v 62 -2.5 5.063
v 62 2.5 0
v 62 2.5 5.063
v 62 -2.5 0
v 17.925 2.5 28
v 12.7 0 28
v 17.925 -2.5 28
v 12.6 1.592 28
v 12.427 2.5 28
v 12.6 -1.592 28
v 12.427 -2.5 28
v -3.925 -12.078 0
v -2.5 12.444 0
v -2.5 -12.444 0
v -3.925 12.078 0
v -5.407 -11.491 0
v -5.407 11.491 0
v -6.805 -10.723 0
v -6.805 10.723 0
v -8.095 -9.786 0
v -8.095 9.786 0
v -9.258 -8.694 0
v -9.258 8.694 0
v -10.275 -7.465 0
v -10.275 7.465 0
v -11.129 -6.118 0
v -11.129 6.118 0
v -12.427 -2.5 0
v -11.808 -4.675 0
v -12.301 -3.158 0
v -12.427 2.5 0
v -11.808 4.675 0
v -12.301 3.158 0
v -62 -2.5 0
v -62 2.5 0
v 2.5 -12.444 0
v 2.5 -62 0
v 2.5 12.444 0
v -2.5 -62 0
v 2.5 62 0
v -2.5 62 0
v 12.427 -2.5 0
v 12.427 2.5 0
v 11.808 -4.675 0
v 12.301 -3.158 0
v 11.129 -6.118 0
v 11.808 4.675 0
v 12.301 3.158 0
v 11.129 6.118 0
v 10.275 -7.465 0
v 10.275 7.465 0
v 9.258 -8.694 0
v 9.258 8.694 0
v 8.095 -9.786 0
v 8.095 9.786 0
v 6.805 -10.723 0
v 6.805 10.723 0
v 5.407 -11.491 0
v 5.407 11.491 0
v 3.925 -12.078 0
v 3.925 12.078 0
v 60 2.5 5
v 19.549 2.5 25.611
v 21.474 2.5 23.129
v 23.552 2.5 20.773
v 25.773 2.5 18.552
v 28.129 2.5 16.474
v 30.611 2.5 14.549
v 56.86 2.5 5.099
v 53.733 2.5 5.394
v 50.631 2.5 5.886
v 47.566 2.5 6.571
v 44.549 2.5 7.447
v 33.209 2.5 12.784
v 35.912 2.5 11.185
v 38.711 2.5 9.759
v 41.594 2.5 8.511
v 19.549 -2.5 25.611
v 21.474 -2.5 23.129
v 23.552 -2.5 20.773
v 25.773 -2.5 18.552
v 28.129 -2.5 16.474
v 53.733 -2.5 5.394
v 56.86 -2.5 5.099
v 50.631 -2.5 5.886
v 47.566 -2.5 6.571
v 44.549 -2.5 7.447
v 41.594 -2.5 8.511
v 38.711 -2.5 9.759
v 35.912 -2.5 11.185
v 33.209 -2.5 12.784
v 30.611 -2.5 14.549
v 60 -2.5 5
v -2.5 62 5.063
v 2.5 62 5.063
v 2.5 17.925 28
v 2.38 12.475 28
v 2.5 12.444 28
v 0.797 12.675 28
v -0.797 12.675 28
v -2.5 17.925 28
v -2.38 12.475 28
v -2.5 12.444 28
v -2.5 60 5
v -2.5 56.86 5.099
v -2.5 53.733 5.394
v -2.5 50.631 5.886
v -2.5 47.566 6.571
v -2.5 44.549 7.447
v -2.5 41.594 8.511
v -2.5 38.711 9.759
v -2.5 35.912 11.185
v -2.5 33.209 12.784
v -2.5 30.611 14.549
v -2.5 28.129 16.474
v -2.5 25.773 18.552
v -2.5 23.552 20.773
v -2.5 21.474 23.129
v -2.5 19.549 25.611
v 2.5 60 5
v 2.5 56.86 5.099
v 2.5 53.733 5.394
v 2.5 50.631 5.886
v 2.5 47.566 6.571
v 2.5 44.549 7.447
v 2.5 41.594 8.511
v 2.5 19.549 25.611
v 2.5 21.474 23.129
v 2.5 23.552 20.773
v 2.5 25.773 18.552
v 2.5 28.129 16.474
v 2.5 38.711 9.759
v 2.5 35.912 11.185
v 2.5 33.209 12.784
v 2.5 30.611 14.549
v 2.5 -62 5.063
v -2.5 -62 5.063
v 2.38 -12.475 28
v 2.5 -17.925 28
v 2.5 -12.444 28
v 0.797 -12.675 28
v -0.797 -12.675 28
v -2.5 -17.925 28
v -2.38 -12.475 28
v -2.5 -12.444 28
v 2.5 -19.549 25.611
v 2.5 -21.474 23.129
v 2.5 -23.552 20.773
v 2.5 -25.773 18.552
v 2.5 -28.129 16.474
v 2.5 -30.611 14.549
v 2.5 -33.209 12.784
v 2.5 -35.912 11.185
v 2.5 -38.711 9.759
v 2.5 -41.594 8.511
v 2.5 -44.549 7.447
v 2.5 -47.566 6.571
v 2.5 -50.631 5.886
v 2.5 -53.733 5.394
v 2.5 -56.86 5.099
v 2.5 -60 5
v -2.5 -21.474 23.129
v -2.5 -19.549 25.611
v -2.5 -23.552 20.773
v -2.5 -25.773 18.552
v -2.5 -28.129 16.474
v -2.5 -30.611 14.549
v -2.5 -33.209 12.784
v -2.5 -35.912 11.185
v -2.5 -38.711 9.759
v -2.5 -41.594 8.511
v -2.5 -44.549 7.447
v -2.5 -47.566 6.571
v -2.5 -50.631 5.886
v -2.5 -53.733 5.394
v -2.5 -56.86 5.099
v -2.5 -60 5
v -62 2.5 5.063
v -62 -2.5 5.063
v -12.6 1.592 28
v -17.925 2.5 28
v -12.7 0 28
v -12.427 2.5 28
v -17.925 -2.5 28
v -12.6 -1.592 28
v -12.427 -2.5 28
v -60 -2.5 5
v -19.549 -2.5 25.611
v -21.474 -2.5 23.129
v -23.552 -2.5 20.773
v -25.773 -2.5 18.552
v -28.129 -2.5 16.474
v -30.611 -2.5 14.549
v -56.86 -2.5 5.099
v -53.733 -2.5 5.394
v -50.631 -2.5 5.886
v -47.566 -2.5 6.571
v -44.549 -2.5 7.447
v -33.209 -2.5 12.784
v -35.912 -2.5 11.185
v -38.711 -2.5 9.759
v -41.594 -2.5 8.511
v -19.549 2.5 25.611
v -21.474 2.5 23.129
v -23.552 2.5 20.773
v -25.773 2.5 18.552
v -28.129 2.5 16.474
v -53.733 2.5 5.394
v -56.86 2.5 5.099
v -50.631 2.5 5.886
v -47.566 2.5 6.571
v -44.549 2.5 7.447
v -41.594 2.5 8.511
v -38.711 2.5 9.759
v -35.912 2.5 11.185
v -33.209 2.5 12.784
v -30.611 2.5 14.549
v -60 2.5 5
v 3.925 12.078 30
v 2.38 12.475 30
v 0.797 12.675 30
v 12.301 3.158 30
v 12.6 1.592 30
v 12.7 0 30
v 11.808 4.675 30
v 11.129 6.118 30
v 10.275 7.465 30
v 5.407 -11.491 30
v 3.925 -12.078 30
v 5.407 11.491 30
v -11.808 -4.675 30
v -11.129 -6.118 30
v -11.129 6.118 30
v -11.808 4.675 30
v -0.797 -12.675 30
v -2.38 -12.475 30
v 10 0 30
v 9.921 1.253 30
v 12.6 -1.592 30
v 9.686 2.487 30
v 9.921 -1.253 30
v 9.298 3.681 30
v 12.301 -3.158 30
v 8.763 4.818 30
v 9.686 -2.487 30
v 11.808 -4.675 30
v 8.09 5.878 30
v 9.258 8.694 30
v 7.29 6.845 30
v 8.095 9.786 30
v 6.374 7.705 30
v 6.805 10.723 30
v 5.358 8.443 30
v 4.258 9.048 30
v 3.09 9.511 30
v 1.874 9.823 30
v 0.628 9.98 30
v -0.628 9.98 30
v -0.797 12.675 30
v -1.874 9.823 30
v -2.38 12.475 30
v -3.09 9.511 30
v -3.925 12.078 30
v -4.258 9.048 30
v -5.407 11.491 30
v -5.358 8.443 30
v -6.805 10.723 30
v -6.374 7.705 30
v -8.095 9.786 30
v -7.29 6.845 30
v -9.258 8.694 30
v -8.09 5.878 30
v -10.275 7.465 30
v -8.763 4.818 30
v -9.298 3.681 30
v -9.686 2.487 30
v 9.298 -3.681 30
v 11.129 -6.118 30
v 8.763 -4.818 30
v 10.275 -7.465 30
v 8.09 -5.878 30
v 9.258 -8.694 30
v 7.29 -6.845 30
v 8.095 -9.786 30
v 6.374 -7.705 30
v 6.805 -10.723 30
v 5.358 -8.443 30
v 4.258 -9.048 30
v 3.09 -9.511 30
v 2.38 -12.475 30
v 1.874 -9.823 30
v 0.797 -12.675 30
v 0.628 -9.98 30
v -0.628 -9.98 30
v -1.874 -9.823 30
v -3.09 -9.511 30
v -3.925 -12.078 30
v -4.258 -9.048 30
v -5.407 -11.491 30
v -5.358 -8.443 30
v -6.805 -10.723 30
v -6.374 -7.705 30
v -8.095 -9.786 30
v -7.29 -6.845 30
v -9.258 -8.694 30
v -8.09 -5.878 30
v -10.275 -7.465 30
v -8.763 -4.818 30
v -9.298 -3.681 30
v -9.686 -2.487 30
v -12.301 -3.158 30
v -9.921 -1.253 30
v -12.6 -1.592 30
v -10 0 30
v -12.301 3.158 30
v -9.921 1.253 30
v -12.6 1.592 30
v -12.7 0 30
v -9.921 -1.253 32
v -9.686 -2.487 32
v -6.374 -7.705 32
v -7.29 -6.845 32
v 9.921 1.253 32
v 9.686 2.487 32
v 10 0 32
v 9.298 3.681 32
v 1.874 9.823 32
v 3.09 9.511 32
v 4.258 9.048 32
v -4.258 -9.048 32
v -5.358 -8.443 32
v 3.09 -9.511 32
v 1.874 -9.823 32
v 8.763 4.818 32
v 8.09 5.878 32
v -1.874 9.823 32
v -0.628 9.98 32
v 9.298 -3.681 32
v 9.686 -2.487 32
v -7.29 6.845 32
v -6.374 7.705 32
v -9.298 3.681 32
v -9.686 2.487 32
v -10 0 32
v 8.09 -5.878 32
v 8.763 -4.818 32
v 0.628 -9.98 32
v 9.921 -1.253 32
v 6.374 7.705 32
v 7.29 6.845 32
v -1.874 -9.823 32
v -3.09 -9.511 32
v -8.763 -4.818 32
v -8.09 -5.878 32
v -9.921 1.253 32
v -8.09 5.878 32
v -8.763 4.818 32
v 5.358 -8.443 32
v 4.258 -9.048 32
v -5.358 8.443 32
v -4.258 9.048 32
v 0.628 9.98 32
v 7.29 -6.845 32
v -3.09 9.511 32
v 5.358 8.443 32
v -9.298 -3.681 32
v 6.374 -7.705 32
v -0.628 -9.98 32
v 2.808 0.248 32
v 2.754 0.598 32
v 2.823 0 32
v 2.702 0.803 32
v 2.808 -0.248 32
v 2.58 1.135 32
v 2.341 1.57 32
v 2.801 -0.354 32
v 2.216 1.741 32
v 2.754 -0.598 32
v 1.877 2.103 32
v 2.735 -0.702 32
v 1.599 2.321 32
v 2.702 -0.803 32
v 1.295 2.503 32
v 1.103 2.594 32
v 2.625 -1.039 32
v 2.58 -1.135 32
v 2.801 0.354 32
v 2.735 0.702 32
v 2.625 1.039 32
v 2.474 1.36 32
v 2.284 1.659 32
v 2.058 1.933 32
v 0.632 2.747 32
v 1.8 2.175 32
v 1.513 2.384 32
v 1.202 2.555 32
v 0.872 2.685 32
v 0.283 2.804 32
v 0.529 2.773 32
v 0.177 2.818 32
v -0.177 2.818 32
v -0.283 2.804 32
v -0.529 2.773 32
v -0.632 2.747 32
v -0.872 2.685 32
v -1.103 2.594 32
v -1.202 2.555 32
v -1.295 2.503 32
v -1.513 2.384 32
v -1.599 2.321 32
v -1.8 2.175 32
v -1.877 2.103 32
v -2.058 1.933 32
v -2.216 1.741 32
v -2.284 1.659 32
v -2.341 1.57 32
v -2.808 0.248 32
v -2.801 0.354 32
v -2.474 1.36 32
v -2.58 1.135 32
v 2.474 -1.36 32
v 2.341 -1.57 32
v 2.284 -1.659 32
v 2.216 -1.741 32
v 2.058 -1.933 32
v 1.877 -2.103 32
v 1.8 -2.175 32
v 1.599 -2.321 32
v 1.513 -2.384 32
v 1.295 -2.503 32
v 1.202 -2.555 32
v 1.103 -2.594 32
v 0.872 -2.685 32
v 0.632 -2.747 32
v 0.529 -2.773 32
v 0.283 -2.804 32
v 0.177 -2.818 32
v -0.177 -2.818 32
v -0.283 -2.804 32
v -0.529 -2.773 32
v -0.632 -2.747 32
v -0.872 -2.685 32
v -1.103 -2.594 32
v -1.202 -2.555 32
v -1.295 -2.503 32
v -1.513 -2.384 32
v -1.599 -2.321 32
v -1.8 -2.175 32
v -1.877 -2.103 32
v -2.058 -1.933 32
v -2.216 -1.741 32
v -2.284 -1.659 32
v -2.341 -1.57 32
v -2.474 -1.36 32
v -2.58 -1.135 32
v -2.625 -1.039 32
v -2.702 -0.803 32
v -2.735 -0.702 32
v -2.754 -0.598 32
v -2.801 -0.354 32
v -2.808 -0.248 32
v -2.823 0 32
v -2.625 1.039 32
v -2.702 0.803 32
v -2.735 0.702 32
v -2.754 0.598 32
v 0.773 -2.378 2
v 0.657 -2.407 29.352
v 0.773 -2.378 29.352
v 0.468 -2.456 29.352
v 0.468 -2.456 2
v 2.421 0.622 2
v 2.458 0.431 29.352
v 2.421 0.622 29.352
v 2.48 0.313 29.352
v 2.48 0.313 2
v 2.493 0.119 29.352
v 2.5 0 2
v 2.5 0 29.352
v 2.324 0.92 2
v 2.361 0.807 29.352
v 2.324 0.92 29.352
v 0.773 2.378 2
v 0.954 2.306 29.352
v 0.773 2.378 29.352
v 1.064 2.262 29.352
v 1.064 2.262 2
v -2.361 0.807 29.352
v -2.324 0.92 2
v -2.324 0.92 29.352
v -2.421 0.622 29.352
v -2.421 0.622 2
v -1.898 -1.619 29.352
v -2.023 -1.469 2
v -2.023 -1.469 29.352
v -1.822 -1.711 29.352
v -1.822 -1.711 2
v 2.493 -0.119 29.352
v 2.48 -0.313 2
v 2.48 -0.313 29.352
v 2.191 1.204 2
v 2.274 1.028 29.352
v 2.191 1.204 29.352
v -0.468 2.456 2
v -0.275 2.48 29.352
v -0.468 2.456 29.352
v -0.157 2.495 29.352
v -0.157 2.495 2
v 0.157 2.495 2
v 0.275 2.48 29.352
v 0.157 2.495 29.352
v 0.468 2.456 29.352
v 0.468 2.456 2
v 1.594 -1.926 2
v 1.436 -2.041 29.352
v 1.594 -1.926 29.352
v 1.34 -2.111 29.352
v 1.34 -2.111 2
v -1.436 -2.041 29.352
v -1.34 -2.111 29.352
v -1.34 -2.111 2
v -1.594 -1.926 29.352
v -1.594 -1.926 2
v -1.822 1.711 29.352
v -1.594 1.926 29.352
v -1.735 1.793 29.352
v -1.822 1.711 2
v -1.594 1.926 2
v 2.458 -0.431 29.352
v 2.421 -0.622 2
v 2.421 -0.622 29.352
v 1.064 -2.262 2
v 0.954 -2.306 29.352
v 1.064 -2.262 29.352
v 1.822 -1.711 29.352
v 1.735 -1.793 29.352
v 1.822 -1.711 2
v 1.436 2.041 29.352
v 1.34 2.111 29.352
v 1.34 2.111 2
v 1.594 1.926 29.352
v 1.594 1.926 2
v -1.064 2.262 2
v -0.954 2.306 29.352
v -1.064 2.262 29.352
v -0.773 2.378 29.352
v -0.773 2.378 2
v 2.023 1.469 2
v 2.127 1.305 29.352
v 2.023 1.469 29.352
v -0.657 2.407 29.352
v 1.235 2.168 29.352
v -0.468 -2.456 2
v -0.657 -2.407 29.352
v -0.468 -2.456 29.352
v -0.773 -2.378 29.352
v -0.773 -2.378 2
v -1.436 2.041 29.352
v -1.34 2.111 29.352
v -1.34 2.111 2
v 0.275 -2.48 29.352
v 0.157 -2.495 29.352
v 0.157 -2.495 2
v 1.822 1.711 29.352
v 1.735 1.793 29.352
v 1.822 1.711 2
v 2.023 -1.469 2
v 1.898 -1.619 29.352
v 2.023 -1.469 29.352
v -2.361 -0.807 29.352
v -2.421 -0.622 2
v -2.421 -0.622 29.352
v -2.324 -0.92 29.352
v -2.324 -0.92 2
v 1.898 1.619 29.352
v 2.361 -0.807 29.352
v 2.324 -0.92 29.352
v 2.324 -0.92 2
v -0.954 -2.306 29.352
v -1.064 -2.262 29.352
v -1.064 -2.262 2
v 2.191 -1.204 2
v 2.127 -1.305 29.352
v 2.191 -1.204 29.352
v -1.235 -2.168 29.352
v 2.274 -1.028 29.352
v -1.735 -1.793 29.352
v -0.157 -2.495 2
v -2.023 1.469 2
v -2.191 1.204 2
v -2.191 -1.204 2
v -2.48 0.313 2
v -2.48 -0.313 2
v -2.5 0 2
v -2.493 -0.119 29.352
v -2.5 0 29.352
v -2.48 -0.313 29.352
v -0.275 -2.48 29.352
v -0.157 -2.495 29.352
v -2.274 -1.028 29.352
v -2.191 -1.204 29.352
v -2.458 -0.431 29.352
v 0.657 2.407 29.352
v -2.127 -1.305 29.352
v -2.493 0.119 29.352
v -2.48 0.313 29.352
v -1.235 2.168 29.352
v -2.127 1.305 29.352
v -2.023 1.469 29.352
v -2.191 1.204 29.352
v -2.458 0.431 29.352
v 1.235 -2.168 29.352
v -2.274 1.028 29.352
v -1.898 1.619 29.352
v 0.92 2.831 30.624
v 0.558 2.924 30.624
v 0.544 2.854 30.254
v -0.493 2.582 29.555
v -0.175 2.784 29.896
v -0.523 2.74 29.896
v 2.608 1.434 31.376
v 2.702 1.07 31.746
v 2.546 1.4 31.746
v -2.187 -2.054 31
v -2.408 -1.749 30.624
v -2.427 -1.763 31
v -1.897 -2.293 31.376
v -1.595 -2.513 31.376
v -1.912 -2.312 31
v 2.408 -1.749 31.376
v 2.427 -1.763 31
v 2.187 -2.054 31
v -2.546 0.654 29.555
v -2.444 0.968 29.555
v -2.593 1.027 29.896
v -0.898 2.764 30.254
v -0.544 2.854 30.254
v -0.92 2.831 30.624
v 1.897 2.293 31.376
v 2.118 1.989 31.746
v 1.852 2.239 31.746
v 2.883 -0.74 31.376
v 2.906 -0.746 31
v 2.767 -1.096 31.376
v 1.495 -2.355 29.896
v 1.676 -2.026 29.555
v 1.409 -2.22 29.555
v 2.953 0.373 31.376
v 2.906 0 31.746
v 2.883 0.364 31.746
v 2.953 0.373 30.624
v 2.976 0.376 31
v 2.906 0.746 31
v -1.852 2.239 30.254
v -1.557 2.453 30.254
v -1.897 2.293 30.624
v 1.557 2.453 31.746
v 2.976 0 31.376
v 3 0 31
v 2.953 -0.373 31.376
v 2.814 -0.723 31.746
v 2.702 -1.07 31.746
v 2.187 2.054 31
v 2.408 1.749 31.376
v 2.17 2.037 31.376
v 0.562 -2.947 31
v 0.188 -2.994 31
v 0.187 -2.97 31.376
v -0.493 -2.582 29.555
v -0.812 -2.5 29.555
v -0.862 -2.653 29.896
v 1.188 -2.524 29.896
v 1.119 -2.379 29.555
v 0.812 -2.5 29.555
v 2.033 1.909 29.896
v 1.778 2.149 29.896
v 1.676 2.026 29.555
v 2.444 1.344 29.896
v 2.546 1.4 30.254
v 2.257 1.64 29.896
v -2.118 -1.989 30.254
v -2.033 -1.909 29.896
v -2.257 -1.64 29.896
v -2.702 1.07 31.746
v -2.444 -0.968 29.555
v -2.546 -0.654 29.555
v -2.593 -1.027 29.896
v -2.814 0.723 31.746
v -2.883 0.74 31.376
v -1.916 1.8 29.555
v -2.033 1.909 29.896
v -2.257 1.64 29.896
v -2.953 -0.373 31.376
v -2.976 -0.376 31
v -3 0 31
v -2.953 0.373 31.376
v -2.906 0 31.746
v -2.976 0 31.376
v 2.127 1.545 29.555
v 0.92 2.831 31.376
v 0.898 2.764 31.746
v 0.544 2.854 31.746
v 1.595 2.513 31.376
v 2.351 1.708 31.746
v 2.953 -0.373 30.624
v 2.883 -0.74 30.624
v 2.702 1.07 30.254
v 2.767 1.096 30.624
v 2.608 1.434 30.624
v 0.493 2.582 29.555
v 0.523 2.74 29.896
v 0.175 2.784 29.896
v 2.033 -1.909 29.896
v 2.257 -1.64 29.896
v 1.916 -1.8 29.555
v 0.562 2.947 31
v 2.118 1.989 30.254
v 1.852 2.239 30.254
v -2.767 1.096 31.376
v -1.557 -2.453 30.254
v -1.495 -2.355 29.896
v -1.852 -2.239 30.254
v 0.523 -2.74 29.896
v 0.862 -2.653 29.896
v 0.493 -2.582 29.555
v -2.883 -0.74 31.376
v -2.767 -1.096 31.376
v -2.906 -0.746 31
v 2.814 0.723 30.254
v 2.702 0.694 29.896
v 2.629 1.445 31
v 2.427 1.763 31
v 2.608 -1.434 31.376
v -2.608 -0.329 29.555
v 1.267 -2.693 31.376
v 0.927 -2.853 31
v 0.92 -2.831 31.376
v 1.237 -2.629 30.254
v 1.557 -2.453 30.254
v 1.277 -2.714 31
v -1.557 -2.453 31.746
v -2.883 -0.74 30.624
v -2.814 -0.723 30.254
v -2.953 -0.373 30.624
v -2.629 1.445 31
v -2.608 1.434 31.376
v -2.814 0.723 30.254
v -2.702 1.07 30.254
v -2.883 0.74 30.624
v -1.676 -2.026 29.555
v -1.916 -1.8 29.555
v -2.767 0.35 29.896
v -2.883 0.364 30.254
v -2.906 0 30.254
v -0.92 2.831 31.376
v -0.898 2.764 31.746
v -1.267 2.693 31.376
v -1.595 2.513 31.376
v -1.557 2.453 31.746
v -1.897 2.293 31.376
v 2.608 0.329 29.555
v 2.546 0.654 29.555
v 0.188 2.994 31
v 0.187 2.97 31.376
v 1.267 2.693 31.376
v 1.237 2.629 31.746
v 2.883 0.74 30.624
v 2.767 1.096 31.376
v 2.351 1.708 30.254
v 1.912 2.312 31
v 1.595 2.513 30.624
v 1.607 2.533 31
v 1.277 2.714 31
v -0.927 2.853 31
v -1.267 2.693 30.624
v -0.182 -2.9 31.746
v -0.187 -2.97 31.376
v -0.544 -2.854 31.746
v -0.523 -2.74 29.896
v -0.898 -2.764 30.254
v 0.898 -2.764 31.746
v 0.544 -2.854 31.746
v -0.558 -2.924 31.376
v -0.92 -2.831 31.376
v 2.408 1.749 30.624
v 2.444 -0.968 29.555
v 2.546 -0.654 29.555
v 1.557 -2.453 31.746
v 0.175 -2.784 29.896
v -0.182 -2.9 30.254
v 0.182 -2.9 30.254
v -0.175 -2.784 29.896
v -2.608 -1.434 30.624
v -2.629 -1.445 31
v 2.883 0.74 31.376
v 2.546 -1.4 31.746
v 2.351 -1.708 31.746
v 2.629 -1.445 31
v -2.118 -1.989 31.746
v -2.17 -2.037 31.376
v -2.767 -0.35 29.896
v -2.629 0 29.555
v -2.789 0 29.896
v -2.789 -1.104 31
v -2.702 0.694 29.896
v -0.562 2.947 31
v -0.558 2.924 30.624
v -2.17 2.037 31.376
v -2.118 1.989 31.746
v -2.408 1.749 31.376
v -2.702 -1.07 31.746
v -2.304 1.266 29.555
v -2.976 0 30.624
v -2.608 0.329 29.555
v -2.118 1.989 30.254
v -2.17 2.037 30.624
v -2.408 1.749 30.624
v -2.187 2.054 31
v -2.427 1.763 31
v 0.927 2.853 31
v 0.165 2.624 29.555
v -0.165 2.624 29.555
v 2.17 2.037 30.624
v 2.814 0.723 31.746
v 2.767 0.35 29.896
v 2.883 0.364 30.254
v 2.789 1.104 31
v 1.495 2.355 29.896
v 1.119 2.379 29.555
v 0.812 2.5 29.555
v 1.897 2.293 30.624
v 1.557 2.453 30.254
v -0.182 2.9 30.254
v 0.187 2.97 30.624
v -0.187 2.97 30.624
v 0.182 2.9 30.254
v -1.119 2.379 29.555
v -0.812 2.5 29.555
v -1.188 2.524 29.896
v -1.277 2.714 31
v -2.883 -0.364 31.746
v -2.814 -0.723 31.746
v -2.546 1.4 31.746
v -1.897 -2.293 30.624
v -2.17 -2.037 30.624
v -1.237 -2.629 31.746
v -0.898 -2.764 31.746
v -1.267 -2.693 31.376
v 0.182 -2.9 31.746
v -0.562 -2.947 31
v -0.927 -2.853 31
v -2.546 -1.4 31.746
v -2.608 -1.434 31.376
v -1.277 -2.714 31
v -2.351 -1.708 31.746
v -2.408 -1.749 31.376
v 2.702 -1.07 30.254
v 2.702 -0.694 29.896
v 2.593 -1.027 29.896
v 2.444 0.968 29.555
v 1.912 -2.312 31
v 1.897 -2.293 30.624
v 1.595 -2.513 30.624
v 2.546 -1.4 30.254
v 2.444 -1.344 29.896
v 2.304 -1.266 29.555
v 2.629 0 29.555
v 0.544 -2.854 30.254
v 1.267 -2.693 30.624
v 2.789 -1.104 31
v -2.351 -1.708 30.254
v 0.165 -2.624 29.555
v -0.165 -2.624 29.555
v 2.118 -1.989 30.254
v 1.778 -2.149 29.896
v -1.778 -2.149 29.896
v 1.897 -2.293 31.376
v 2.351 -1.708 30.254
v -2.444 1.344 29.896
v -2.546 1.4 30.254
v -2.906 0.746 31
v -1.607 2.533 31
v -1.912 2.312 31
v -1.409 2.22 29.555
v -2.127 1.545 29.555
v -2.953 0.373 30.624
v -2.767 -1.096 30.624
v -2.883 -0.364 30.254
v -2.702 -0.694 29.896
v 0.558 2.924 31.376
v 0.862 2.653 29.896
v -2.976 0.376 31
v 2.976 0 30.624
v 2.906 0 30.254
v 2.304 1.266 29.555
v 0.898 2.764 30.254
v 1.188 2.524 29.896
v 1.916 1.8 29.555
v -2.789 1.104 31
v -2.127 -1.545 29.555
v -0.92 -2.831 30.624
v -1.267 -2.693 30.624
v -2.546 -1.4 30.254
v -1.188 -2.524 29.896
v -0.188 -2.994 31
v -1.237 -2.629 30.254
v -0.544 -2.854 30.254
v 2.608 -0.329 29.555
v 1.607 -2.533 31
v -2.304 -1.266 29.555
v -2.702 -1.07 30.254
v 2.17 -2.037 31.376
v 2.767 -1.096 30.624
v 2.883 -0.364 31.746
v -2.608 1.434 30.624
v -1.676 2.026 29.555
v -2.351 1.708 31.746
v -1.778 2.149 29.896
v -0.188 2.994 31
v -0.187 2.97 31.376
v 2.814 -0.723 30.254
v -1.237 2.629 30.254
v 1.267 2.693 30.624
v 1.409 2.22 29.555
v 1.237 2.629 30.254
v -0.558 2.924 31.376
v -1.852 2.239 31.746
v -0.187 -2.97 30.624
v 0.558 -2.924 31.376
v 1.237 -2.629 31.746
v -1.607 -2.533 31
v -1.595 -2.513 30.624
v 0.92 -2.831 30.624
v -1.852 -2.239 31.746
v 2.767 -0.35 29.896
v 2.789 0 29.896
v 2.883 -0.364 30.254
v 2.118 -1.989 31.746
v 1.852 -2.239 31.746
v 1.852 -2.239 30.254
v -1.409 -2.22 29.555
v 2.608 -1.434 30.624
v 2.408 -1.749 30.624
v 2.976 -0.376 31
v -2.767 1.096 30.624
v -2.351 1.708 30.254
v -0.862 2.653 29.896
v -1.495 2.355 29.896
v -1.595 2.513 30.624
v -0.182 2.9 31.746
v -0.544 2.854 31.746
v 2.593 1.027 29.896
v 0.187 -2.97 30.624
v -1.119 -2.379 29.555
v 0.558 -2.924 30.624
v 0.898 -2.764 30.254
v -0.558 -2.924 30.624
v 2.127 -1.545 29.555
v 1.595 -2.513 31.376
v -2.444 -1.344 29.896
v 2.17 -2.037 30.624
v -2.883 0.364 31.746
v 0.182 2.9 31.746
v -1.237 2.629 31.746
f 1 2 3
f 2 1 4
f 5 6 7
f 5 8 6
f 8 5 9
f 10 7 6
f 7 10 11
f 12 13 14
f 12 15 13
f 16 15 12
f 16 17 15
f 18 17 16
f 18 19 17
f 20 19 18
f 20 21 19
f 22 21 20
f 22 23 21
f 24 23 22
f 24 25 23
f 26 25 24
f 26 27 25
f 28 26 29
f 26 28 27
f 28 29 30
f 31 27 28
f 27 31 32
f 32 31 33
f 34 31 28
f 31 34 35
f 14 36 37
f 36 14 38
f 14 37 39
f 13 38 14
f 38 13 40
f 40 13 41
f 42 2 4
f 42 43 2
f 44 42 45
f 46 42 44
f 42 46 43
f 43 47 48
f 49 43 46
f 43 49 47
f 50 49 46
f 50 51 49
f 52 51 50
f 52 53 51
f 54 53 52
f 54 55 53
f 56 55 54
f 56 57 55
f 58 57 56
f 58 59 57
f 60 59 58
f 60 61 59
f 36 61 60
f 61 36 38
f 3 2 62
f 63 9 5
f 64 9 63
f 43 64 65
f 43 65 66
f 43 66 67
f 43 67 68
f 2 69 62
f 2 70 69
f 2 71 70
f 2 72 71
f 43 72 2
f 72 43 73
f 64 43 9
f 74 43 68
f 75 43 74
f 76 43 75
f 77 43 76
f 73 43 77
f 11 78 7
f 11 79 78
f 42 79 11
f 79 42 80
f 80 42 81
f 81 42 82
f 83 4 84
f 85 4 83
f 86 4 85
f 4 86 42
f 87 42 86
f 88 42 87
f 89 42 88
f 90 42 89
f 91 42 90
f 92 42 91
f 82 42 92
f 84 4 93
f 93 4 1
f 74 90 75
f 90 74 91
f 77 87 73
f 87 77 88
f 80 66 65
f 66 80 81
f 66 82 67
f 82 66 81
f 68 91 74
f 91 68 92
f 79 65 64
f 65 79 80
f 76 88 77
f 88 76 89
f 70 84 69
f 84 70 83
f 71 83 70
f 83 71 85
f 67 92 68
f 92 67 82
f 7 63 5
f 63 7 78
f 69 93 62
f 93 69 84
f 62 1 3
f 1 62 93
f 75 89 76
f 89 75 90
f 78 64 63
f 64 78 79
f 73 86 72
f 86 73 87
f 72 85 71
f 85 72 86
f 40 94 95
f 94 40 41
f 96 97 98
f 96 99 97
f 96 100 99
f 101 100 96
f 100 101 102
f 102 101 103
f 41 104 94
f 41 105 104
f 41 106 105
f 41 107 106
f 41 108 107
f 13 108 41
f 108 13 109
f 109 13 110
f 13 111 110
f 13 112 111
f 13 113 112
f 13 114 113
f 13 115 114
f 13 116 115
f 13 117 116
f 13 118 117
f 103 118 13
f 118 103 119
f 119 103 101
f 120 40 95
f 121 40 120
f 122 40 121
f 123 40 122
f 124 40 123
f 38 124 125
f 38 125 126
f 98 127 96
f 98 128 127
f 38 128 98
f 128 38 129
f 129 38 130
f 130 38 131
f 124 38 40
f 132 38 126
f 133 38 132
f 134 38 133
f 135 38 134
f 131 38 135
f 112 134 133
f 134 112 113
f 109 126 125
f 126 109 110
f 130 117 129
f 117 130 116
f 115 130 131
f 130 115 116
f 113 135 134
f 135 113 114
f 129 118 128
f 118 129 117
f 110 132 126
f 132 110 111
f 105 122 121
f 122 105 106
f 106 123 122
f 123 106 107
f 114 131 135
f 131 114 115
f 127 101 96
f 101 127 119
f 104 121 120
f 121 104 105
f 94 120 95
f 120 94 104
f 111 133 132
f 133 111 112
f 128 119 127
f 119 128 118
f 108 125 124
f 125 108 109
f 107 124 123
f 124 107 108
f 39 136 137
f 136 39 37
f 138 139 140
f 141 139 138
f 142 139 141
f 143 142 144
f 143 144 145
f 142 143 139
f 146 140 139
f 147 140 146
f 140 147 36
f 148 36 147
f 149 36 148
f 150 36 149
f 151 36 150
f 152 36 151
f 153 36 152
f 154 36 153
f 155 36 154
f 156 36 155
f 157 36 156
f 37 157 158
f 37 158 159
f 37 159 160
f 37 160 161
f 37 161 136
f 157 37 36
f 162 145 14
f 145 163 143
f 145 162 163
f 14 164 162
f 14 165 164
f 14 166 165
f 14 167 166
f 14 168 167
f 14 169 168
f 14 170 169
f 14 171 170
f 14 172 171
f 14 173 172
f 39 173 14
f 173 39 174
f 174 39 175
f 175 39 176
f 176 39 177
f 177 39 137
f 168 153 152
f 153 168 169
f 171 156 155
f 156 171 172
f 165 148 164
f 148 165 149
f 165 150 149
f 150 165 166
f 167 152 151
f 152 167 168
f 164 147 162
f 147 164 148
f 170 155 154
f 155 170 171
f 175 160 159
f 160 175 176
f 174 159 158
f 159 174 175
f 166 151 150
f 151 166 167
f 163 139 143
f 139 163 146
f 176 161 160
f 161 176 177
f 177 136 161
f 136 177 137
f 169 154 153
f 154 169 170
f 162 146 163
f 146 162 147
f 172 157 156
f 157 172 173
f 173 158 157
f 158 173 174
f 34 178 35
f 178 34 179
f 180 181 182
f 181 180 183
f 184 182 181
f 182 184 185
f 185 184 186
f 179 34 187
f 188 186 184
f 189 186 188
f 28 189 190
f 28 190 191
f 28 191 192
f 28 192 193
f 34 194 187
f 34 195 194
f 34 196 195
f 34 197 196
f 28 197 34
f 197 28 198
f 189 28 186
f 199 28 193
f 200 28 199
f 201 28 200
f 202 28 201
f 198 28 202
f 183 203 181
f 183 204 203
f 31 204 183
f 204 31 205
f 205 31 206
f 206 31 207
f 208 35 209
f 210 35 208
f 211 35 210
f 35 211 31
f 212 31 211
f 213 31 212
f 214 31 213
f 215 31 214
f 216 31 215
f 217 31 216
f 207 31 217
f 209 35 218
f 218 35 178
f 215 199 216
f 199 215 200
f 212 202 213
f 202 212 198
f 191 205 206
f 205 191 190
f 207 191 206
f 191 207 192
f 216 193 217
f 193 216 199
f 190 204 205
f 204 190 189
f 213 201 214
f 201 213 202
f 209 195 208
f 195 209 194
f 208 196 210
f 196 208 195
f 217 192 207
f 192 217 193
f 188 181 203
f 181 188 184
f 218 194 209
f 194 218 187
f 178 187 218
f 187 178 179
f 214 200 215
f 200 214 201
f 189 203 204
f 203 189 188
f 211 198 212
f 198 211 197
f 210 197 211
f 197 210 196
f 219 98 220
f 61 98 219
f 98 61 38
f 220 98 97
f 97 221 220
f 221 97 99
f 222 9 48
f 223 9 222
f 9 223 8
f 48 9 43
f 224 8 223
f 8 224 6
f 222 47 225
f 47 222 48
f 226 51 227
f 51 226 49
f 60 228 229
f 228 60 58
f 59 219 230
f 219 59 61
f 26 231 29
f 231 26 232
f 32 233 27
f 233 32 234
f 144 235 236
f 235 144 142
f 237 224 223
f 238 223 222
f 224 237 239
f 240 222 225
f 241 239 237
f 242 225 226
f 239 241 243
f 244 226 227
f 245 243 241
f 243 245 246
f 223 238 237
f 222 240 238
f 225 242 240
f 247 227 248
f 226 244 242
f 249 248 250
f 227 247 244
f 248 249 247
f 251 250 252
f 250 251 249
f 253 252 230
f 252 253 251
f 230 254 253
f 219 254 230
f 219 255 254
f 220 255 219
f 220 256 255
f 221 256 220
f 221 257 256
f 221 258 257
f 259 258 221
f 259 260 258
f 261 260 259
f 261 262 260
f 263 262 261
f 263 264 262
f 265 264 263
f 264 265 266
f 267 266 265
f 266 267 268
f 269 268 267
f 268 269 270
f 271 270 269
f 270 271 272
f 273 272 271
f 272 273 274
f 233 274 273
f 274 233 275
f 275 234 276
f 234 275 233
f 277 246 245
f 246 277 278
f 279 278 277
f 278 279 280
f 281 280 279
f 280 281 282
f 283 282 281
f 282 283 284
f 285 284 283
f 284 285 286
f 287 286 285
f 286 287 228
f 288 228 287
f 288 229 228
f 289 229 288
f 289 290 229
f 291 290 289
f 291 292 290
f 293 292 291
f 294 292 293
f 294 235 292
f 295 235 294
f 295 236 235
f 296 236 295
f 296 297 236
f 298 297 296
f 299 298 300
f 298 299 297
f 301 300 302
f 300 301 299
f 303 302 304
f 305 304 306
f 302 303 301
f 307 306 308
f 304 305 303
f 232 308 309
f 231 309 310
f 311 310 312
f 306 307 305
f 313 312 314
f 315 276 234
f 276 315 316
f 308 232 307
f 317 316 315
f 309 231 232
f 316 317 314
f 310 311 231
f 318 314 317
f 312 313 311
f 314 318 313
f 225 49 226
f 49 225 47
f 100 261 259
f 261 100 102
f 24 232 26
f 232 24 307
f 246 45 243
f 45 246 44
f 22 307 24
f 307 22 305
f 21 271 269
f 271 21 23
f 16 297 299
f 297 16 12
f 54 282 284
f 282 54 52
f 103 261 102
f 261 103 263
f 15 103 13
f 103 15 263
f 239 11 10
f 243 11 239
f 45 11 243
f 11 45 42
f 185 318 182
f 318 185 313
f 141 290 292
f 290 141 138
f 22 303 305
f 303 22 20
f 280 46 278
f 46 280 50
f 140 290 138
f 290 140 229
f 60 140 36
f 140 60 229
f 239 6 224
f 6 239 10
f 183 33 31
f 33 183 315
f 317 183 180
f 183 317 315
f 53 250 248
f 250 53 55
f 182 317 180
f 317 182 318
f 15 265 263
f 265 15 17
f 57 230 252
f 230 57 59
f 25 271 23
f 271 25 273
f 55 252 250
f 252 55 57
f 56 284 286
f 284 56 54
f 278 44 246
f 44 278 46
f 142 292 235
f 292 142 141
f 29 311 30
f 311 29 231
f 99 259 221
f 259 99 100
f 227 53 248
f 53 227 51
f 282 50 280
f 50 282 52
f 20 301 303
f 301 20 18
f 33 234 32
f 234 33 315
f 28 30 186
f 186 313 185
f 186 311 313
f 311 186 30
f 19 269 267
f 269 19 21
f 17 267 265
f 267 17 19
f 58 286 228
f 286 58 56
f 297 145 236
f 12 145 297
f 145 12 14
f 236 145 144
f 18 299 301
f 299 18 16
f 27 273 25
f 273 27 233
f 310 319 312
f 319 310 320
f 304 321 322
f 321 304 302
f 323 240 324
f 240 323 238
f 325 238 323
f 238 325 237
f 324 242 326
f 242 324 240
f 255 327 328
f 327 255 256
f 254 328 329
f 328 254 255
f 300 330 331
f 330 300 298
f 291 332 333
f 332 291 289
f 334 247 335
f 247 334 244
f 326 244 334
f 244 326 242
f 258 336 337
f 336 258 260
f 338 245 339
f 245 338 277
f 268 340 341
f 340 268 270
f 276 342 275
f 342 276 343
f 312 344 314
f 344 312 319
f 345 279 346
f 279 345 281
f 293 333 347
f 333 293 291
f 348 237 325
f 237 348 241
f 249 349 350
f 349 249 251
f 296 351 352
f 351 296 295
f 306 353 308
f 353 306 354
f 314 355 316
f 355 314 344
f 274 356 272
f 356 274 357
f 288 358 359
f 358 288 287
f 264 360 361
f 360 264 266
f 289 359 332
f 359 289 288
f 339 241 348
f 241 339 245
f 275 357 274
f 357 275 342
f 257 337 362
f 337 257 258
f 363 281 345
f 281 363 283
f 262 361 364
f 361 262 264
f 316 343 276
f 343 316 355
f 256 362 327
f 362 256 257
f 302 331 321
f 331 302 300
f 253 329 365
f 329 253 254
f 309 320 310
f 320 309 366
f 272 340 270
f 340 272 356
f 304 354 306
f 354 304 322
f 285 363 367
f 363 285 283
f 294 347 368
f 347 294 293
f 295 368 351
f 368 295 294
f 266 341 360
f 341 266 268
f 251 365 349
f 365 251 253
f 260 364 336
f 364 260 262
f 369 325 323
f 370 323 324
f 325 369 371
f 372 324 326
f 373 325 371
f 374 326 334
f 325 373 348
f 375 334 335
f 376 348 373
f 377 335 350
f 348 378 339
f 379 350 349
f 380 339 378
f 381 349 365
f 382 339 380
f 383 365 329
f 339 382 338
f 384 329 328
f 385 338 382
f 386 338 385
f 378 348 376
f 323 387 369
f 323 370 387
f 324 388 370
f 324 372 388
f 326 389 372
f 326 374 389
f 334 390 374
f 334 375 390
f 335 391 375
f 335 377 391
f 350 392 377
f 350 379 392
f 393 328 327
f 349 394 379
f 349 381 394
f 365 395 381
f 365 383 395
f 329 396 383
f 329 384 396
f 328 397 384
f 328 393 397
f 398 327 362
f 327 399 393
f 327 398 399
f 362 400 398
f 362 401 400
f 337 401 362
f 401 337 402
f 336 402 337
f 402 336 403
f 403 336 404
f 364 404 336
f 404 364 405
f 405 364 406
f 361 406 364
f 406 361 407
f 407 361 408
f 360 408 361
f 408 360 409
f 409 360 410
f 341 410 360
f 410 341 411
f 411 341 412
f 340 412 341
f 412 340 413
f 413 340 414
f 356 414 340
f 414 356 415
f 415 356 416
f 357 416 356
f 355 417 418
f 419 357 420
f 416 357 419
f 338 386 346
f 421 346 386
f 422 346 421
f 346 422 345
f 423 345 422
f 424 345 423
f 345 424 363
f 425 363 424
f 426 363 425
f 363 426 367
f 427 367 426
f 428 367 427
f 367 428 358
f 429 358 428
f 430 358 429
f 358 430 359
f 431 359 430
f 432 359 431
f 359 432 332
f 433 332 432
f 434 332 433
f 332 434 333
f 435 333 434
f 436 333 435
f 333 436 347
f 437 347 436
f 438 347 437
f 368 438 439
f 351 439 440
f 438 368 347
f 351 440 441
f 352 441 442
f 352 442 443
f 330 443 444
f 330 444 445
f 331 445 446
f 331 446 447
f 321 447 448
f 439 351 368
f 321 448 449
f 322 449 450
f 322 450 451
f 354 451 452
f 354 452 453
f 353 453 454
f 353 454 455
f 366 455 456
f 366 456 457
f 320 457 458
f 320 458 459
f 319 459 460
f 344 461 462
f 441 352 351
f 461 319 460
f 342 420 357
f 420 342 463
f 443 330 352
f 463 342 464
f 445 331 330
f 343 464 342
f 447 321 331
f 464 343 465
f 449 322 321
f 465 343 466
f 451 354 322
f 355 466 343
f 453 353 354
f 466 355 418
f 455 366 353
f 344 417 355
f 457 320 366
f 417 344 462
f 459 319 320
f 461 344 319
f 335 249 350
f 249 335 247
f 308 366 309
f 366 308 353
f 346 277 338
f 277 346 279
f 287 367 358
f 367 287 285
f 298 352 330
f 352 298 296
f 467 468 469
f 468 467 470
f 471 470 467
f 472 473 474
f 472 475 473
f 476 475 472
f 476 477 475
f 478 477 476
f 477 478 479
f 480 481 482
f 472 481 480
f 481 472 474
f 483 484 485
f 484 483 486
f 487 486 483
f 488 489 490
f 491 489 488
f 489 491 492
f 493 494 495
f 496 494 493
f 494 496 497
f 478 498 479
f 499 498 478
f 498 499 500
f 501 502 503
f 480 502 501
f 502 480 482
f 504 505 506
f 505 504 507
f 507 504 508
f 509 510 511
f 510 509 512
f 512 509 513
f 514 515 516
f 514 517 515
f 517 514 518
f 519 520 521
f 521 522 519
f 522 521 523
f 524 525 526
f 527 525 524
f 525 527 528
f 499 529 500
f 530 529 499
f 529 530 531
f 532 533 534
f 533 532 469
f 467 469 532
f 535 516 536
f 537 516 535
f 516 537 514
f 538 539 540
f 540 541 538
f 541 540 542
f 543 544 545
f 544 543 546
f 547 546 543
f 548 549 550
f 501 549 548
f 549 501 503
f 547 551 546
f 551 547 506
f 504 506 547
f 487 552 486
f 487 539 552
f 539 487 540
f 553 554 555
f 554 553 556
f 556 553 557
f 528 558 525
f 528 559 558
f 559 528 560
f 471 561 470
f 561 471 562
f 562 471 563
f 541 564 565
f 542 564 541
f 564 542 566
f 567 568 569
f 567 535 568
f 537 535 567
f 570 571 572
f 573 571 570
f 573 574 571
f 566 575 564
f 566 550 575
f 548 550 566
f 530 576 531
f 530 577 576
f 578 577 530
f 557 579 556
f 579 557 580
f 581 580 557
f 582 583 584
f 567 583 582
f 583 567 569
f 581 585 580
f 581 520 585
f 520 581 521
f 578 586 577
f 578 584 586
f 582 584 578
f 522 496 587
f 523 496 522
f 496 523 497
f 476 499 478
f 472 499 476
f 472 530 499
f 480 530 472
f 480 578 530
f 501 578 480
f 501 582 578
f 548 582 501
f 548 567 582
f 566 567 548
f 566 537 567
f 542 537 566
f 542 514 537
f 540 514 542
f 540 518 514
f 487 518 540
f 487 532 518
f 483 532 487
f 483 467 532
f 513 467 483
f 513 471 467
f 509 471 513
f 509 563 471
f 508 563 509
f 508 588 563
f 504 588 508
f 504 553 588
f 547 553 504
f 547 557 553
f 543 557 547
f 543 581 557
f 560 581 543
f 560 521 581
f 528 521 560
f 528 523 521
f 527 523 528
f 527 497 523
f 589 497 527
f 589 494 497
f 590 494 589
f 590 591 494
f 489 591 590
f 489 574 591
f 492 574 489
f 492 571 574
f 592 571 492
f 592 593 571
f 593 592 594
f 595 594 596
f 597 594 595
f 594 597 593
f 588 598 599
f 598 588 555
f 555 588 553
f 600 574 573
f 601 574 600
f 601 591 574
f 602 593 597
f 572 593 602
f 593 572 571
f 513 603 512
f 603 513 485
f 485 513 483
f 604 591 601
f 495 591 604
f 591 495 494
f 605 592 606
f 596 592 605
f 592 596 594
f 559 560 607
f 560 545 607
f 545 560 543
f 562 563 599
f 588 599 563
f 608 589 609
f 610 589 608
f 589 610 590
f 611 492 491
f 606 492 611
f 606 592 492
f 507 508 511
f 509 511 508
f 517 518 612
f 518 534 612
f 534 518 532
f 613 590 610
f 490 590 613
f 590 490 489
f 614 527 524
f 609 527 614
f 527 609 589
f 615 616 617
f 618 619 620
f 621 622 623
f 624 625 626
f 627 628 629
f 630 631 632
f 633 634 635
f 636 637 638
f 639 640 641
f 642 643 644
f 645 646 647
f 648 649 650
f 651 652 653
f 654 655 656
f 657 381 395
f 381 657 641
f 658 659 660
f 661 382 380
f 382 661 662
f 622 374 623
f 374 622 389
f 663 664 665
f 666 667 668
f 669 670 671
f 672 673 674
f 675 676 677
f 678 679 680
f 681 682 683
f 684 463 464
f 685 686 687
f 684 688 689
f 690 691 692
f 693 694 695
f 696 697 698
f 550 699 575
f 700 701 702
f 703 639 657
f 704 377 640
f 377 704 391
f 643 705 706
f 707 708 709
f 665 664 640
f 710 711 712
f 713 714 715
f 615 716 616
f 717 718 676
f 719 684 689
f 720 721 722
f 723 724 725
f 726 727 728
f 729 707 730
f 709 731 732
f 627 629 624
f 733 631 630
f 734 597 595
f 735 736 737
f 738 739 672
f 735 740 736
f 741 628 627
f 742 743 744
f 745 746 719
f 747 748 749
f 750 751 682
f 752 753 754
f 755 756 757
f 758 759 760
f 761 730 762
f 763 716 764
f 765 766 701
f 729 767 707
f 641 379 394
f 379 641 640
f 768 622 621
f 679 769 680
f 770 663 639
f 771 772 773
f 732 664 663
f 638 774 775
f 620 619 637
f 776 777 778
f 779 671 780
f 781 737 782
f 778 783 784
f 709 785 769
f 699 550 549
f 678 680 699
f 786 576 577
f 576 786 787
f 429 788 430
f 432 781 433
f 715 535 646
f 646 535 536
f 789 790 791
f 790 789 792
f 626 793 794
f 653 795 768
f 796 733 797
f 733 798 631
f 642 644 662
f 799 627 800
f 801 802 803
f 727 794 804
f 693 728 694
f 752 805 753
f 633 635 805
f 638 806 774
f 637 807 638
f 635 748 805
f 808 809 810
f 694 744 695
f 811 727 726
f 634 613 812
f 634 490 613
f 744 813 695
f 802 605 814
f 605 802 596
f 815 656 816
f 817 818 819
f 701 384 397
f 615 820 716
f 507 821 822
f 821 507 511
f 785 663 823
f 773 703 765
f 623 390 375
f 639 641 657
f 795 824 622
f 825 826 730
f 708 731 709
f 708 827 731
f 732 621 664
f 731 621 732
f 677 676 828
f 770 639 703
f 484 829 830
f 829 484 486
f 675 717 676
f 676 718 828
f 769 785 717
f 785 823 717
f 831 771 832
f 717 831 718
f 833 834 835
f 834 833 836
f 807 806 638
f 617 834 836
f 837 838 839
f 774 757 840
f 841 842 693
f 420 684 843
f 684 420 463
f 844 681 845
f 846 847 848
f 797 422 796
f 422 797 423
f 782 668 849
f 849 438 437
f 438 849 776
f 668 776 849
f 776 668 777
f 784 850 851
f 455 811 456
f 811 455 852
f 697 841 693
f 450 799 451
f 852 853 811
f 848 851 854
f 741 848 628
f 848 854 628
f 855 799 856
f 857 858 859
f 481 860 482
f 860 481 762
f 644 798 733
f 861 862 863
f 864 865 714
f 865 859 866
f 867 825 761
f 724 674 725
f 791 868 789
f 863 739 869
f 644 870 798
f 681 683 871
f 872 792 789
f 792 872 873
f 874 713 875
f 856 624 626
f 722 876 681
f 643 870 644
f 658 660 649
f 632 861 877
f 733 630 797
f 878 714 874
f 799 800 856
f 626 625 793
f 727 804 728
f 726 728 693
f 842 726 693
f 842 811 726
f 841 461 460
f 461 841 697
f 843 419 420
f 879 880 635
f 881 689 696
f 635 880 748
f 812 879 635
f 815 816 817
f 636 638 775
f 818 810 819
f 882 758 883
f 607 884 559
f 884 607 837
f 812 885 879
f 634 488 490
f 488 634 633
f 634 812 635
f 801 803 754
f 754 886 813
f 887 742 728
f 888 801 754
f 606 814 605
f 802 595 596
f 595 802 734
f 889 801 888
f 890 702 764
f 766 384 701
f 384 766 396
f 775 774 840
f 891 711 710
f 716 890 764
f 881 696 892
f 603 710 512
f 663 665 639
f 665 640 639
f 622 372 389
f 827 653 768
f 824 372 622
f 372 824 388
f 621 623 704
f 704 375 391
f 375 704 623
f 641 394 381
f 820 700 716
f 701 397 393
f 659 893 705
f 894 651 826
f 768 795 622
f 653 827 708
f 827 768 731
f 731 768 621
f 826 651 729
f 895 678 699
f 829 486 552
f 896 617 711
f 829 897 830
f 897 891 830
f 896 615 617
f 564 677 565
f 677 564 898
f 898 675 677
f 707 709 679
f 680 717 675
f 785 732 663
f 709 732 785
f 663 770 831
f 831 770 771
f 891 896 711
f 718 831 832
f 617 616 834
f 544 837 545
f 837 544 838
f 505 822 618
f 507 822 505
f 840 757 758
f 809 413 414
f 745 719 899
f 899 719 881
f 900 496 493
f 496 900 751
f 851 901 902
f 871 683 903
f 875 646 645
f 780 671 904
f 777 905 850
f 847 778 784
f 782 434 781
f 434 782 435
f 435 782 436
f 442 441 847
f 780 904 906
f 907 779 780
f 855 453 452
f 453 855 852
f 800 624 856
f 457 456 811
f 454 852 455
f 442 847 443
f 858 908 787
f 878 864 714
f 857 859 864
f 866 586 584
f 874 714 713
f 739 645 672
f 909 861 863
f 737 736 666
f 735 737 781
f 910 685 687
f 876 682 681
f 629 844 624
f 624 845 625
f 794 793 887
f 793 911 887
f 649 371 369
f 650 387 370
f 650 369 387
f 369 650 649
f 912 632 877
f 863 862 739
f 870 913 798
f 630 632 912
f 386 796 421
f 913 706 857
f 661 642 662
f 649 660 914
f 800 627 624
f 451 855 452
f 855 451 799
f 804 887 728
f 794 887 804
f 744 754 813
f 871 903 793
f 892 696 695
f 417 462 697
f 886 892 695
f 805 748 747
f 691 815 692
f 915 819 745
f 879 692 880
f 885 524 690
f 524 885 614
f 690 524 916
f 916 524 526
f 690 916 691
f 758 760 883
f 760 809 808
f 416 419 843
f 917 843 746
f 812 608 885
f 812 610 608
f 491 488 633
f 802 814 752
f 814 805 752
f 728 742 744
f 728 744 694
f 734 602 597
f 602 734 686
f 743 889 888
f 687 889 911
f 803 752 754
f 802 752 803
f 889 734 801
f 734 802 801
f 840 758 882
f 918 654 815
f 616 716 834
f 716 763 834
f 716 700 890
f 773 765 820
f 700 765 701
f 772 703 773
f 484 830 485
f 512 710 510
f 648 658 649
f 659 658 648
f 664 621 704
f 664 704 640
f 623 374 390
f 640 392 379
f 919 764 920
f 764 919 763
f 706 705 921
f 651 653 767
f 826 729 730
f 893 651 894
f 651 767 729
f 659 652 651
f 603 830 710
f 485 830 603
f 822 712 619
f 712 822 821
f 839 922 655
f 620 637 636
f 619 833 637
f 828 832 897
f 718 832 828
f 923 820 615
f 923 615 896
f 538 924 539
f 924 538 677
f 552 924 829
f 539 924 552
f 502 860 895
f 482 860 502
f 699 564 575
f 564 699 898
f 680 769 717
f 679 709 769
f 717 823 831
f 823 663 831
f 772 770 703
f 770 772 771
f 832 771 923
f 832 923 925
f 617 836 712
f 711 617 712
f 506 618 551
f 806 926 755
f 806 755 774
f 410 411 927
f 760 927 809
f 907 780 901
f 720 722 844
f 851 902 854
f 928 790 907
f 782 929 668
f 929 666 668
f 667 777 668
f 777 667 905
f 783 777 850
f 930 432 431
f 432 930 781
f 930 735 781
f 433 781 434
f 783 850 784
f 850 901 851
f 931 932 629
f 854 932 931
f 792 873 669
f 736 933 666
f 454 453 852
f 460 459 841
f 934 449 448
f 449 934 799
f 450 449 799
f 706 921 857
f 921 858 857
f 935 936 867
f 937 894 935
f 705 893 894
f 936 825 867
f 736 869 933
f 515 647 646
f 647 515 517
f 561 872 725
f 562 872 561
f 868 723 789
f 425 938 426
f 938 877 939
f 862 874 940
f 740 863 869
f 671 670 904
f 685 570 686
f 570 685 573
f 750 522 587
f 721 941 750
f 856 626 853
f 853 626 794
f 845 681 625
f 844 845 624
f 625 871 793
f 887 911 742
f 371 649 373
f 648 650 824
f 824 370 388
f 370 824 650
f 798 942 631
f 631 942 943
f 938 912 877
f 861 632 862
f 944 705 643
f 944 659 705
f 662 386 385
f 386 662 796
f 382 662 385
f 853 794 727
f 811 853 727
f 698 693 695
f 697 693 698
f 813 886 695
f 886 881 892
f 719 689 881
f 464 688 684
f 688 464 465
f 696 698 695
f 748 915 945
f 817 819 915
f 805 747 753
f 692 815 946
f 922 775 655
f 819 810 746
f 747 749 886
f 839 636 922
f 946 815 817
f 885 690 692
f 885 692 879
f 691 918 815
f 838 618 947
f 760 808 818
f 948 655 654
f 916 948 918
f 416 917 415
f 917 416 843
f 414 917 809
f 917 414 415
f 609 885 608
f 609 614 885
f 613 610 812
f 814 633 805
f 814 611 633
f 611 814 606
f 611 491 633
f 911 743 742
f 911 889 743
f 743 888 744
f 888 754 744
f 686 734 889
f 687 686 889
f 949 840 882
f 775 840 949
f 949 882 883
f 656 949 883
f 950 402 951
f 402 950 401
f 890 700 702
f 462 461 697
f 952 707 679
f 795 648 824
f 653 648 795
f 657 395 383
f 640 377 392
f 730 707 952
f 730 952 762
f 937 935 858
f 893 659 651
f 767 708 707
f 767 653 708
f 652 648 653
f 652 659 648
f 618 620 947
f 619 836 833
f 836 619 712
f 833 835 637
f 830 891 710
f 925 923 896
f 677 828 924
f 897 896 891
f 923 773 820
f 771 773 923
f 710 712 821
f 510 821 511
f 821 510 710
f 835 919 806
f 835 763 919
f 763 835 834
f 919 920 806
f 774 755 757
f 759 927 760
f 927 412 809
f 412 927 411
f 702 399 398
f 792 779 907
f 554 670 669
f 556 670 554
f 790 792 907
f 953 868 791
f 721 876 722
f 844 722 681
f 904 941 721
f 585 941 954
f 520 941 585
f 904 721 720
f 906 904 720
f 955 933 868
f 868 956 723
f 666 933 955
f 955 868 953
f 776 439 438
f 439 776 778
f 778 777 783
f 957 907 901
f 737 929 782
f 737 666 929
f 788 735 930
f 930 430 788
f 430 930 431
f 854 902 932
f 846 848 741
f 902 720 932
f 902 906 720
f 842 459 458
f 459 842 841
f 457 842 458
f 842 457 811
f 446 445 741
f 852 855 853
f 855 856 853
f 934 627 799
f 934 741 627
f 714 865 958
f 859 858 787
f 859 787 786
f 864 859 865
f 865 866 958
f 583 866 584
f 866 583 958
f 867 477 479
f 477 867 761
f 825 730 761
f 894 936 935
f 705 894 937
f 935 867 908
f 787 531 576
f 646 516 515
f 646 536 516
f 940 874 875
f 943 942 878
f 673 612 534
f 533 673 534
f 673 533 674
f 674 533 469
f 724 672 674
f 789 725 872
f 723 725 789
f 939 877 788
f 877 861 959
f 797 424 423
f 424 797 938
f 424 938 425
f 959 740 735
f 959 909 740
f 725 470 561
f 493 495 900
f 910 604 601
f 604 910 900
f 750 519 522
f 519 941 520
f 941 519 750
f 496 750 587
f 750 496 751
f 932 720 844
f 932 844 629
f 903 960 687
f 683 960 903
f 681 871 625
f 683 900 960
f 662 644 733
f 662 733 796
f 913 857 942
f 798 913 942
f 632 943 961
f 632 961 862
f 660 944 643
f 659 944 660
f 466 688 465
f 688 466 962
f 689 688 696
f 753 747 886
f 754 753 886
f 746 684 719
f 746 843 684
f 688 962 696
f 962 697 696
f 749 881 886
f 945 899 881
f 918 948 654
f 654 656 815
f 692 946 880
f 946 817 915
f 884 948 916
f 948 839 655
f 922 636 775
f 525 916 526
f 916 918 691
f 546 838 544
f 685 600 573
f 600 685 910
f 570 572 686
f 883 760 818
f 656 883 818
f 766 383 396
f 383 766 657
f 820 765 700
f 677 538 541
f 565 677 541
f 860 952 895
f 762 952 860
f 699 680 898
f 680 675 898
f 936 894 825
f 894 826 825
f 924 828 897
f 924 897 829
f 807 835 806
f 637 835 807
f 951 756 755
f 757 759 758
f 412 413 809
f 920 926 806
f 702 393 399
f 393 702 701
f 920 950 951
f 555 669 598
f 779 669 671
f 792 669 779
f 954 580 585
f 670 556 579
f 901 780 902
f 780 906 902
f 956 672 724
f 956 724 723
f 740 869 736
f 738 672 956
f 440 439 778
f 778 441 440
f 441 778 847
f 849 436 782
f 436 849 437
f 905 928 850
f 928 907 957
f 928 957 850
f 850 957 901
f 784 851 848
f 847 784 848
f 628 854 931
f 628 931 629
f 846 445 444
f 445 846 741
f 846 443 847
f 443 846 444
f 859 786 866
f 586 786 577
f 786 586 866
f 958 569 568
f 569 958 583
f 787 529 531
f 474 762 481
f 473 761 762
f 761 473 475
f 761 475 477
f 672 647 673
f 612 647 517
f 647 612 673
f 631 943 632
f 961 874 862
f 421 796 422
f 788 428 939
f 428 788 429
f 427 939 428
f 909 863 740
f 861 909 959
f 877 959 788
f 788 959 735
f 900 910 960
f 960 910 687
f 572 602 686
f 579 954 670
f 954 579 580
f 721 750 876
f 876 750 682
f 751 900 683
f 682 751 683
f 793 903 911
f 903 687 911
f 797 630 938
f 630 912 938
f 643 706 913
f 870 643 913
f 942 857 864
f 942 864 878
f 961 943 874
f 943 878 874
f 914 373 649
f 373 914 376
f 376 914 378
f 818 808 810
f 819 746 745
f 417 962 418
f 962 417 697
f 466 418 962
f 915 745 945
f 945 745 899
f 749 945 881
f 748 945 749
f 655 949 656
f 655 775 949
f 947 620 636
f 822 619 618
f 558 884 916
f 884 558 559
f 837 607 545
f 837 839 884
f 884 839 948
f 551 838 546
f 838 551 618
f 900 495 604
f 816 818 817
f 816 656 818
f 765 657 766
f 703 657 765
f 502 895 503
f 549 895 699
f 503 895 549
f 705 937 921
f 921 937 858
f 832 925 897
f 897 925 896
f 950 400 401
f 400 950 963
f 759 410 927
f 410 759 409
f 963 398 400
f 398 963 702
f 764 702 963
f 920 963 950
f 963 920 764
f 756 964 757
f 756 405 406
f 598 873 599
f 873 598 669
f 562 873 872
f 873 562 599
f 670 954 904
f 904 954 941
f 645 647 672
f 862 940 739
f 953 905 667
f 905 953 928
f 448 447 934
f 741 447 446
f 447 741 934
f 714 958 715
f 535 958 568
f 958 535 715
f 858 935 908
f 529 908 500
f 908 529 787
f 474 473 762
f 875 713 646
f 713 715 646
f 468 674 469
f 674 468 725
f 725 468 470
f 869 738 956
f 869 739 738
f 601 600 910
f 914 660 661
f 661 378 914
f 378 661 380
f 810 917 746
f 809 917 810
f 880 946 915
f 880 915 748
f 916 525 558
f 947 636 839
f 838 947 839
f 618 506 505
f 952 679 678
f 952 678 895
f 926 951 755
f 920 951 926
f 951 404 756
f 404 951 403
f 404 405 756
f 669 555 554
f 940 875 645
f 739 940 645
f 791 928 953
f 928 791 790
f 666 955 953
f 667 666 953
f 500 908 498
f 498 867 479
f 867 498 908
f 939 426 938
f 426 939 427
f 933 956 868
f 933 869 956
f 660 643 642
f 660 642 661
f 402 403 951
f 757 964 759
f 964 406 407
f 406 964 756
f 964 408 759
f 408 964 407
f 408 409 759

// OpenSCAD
/* Global */

INNER_DIAMETER = 5;

stand();
module stand()
{
   union()
   {
       wings();
       core();
   }     
}
module core()
{
 difference()
 {   
  difference()
  {
   union()
   {   
   translate([0,0,15])   
    cylinder(d=25.4, h=30, center=true, $fn=50);
   translate([0,0,16])   
    cylinder(d=20, h=32, center=true, $fn=50);
   }
   translate([0,0,18])
      cylinder(d=INNER_DIAMETER, h=32, center=true, $fn=50);
  }    
   translate([0,0,31])
   sphere(d=INNER_DIAMETER+1, center=true, $fn=50);  
}
}

module wing()
{
  difference()
  {
   translate([12, -2.5,0])
    cube([50,5,28]); 
   translate([60,0,55])   
   rotate([90,0,0])  
      cylinder(r=50, h=100, center=true, $fn=100);
     
  } 
}

module wings()
{
    union()
    {
        wing();
        rotate([0,0,90]) wing();
        rotate([0,0,-90]) wing();
        rotate([0,0,180]) wing();
    }
}
